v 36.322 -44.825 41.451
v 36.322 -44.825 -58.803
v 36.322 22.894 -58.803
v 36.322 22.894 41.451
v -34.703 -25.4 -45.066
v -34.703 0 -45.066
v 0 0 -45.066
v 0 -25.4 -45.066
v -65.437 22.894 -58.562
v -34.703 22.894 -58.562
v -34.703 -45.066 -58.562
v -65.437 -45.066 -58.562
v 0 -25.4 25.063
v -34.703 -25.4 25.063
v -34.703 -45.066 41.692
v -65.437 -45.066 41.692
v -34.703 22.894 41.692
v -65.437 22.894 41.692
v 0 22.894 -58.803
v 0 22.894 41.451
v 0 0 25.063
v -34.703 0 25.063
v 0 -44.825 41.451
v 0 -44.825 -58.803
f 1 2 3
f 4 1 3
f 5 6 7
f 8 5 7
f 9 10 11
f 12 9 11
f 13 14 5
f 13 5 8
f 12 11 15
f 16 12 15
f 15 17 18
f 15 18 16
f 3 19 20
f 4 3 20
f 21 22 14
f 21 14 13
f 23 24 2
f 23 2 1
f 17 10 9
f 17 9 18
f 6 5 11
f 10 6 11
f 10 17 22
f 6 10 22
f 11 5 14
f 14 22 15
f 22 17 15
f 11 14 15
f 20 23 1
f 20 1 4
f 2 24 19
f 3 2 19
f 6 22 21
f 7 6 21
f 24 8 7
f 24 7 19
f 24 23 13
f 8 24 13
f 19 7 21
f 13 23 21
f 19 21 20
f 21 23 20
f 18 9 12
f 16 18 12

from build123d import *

# Parameters (mm, degrees)
F0_W     = 70.852228
F0_H     = 70.129245
F1_DEPTH = 25.4
F2_W     = 67.719309
F2_H     = 100.253496
F3_DEPTH = 36.322
F4_W     = 67.960299
F4_H     = 100.253489
F5_DEPTH = 30.734


with BuildPart() as f1:
    # F0 (on Front) → F1 (new body)
    with BuildSketch(Plane.XZ):
        with Locations((0.722982, -10.00125)):
            Rectangle(F0_W, F0_H)
    extrude(amount=F1_DEPTH)

    # F2 (on Right) → F3 (join)
    with BuildSketch(Plane.YZ):
        with Locations((-10.965226, -8.675782)):
            Rectangle(F2_W, F2_H)
    extrude(amount=F3_DEPTH)

    # F4 (on face) → F5 (join)
    with BuildSketch(Plane(origin=(-34.703132, 0, 0), x_dir=(0, -1, 0), z_dir=(-1, 0, 0))):
        with Locations((11.085722, -8.434789)):
            Rectangle(F4_W, F4_H)
    extrude(amount=F5_DEPTH)


solid = f1.part
